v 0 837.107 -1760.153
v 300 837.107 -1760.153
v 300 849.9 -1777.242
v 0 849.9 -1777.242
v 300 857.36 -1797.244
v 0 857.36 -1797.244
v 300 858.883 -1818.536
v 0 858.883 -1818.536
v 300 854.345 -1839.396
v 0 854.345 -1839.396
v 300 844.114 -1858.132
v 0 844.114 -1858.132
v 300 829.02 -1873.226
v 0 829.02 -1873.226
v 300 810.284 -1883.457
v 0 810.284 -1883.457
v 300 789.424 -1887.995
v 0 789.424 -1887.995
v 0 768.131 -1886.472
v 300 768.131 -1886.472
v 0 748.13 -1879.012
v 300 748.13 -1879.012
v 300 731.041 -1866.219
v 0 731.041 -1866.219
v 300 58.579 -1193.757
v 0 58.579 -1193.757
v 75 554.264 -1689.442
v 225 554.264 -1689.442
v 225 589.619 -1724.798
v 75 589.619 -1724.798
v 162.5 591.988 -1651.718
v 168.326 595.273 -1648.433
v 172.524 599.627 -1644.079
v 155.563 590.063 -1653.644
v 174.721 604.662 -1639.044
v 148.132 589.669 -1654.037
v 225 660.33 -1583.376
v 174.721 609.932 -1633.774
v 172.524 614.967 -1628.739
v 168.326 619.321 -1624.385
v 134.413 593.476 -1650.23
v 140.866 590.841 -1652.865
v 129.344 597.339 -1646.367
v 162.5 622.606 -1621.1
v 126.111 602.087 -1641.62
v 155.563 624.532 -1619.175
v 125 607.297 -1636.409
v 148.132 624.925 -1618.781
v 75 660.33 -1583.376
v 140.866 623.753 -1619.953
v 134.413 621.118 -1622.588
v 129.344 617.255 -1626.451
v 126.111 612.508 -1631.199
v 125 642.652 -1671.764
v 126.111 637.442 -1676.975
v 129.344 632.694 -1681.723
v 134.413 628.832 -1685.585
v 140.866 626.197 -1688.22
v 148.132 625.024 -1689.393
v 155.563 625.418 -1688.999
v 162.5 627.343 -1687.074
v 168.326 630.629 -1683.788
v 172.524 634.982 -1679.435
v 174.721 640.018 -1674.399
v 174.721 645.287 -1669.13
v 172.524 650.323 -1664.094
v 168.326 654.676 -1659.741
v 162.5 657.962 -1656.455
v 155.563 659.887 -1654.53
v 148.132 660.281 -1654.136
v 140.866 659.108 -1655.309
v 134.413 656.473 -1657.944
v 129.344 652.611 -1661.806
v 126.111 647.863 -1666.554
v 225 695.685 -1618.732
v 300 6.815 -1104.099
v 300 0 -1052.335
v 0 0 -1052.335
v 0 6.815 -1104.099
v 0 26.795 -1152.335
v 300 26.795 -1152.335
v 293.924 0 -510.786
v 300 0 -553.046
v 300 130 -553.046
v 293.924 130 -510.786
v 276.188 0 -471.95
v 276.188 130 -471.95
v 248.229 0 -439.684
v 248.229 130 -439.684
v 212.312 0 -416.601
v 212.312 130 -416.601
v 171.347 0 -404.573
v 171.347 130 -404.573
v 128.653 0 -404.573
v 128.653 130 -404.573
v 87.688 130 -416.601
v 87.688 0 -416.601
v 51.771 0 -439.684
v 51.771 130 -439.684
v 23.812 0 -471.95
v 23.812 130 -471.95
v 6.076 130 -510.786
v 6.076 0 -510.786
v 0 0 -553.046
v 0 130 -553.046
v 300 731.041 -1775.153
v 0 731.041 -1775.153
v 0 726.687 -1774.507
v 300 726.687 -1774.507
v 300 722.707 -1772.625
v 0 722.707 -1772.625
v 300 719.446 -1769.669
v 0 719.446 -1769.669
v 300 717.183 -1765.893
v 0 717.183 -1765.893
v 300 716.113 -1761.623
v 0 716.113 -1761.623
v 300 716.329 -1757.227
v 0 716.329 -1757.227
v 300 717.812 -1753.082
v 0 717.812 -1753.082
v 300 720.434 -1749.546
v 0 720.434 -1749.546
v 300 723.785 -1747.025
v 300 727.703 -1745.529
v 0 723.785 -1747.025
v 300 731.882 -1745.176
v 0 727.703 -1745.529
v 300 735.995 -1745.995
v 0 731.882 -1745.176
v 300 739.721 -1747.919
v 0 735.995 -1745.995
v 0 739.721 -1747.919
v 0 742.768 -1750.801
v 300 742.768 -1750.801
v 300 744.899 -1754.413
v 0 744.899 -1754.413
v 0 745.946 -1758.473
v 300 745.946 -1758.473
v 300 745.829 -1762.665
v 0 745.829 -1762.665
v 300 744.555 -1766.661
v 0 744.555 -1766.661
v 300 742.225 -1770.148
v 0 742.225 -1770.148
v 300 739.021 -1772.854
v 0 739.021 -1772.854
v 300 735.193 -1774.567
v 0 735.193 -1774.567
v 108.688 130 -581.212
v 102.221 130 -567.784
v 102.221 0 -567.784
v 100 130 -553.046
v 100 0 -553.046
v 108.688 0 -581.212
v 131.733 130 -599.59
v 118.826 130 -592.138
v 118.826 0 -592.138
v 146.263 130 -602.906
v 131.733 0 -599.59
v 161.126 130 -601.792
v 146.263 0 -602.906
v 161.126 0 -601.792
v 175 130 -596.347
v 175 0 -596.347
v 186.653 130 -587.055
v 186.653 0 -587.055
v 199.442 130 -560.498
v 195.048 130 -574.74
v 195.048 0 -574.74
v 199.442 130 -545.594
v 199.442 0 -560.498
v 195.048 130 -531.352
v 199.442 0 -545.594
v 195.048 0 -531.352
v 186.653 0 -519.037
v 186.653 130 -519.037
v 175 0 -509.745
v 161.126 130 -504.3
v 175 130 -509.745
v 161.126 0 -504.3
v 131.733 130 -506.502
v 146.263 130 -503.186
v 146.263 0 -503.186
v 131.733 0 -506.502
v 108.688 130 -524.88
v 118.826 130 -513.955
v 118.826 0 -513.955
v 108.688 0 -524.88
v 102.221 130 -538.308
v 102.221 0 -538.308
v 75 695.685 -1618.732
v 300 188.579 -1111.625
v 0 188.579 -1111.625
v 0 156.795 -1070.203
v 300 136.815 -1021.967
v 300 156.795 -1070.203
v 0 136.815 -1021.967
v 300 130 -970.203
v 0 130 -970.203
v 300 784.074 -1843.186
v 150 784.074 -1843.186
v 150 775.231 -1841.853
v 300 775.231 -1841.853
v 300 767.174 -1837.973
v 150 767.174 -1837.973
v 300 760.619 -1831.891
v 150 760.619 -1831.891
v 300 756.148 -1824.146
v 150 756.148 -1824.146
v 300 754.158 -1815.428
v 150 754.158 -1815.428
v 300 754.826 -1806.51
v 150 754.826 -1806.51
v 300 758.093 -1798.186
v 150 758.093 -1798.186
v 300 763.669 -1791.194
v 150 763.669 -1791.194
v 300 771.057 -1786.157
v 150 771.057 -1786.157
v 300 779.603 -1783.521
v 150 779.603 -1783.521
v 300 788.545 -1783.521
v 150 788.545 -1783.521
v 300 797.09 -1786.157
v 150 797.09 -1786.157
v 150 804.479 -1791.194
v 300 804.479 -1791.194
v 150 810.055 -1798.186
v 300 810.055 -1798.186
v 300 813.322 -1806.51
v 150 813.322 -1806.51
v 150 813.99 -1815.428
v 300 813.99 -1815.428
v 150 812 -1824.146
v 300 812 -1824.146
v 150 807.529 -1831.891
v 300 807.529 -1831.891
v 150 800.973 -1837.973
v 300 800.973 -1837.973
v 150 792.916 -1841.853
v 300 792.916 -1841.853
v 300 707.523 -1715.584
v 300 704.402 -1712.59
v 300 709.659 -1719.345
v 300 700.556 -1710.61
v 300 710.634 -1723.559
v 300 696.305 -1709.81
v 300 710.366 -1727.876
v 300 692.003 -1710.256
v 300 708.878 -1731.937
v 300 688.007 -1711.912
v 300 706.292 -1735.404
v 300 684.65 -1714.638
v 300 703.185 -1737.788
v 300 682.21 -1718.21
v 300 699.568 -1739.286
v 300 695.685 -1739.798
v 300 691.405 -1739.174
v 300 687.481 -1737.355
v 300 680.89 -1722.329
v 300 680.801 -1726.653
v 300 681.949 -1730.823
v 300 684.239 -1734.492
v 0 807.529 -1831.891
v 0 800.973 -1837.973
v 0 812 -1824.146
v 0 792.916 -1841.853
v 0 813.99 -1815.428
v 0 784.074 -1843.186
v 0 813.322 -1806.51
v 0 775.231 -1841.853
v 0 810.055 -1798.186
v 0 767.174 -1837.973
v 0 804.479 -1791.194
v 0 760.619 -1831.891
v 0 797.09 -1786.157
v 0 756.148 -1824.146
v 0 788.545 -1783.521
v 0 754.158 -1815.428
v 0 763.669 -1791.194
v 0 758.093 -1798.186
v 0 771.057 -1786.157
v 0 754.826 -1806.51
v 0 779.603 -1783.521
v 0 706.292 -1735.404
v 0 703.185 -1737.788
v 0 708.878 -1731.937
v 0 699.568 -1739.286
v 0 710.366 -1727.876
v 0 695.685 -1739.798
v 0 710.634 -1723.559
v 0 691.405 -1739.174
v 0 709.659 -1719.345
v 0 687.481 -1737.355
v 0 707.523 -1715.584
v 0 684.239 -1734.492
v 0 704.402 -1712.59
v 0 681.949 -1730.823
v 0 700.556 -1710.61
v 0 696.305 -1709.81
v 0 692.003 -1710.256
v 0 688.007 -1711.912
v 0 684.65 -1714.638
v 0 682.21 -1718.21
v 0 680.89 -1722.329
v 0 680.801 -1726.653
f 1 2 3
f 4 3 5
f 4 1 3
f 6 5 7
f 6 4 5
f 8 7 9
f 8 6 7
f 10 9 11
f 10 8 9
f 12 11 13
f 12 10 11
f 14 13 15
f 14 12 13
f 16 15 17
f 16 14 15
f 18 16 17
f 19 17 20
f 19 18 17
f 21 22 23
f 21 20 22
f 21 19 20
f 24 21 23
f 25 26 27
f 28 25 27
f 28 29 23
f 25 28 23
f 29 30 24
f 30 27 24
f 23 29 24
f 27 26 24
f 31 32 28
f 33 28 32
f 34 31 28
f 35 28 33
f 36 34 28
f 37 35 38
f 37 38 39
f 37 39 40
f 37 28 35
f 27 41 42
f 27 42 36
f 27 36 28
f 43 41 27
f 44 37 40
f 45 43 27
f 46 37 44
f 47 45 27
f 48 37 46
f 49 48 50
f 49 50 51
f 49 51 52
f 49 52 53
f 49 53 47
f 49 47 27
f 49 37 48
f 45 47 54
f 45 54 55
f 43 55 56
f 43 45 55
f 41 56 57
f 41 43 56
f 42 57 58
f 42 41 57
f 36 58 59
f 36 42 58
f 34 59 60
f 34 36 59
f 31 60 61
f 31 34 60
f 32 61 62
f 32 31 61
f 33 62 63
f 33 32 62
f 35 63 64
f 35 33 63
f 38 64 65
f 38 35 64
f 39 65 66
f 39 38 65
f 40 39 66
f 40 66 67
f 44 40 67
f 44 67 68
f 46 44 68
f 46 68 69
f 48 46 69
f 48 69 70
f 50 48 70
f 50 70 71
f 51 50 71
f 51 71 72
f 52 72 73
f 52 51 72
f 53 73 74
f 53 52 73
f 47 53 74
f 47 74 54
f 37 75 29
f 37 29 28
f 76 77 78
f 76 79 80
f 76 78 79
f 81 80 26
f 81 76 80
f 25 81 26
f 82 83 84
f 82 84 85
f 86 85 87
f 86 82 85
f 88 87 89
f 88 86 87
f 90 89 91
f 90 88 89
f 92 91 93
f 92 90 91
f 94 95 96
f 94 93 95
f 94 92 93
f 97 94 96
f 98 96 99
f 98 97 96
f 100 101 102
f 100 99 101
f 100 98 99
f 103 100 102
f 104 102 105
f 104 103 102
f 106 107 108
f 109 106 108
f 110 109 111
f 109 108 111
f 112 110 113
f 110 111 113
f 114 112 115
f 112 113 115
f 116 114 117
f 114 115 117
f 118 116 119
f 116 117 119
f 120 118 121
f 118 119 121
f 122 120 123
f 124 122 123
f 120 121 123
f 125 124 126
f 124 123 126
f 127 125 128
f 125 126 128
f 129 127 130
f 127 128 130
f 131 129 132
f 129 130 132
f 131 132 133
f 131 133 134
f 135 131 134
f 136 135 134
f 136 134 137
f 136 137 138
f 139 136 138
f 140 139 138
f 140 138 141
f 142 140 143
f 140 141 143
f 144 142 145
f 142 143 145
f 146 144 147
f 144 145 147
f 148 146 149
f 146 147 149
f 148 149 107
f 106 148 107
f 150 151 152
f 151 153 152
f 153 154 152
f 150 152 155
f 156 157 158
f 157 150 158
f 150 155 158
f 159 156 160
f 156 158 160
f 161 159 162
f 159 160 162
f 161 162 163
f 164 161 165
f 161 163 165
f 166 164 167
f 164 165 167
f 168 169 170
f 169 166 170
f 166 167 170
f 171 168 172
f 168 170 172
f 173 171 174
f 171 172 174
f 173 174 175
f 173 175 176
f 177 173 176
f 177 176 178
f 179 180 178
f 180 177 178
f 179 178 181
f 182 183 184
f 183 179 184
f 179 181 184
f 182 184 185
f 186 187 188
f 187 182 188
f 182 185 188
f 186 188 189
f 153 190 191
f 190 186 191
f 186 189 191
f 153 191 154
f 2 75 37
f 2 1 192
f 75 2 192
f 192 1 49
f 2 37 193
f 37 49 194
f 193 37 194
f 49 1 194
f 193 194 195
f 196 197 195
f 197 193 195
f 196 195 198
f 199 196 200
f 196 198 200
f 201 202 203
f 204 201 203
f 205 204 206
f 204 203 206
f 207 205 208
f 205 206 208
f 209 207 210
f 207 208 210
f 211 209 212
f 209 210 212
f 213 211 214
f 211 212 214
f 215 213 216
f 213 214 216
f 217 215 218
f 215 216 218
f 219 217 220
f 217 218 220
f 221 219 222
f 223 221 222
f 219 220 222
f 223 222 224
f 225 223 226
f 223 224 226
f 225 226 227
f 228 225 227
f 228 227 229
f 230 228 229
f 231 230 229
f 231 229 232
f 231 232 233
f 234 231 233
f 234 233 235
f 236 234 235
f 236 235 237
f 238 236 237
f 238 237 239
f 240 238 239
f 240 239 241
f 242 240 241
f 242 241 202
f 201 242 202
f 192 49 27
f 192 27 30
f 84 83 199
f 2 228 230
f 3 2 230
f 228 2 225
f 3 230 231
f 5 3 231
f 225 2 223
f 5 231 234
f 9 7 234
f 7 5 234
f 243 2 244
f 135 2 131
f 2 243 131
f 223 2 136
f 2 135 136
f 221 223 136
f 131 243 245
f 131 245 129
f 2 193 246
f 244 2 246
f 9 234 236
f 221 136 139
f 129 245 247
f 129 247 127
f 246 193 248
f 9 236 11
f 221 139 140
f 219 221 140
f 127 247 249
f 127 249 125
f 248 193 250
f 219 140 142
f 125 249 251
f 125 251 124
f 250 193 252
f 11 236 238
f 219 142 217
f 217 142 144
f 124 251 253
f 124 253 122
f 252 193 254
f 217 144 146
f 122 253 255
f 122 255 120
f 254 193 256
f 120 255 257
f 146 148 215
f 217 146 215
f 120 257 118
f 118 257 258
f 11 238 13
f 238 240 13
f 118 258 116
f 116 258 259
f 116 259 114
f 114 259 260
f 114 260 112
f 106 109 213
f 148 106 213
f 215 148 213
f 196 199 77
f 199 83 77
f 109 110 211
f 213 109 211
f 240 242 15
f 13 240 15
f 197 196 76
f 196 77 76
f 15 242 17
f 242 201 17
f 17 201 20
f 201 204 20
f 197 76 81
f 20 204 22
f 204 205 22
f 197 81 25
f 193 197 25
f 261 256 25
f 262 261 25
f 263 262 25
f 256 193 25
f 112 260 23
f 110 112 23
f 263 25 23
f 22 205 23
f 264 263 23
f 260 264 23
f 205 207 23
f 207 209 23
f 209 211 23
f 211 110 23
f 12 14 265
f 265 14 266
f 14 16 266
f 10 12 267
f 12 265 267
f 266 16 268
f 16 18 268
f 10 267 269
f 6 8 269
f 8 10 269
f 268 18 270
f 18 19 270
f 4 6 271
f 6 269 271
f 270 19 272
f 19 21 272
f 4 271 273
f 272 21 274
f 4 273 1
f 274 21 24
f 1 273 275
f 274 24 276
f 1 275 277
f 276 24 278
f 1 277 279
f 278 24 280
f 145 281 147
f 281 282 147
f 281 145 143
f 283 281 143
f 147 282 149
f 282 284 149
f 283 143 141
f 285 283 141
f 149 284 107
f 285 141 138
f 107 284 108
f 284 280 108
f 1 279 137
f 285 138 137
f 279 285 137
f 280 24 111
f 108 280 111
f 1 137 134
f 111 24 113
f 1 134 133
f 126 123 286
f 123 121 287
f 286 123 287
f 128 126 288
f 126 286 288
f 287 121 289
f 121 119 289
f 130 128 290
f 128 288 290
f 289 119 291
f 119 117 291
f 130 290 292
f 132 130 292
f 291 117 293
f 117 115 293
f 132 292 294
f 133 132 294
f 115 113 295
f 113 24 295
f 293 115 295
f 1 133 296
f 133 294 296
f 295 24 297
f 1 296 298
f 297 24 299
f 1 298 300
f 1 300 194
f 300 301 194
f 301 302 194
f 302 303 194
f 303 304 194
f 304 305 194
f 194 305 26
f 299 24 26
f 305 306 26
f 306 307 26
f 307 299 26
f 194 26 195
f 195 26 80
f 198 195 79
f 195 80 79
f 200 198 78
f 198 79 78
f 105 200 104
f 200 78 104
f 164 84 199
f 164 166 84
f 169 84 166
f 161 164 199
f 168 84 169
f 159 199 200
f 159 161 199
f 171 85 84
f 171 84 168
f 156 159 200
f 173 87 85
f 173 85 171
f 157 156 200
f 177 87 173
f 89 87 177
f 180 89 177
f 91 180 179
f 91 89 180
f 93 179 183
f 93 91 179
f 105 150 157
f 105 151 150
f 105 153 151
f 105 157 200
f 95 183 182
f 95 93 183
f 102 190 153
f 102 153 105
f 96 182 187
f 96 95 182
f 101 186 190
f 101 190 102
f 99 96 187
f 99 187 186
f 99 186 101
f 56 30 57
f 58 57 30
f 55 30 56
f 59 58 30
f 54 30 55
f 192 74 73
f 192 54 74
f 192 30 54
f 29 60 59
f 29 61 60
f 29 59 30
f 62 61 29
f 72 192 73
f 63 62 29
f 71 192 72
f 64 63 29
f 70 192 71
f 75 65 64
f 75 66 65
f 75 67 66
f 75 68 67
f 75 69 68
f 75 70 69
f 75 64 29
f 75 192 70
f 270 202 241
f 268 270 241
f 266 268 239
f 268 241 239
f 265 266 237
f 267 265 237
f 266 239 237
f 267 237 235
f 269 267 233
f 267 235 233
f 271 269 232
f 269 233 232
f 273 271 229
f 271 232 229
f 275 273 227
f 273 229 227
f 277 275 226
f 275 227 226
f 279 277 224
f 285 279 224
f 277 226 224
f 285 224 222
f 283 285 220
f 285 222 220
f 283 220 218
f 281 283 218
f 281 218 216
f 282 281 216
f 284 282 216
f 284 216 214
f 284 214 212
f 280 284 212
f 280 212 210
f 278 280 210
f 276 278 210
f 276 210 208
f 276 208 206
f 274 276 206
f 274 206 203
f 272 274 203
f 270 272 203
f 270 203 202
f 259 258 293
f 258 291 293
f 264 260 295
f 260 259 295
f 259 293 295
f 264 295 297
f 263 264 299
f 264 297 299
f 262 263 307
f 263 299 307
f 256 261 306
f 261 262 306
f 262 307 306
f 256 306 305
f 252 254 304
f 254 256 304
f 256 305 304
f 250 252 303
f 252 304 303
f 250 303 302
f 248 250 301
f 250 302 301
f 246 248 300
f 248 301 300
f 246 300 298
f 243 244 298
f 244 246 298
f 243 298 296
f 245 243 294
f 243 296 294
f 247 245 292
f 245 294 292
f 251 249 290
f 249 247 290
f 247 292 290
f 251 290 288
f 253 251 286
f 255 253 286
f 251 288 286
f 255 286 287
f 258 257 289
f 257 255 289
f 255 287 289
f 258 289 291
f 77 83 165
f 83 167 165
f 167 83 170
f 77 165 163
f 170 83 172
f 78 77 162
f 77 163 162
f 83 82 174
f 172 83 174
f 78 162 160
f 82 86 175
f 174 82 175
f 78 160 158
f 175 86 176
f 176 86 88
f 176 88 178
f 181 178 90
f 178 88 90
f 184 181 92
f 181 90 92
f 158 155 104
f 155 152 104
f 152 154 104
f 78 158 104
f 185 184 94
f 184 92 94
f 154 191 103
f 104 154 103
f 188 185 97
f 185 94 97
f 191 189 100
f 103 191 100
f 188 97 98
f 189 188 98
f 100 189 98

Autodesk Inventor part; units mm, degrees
ref_plane "YZ Plane" through (0, 0, 0) normal (1, 0, 0) x (0, 1, 0)
ref_plane "XZ Plane" through (0, 0, 0) normal (0, 1, 0) x (-1, 0, 0)
ref_plane "XY Plane" through (0, 0, 0) normal (0, 0, 1) x (1, 0, 0)
sketch "草圖1" plane through (0, 0, 0) normal (0, 1, 0) x (-1, 0, 0)
  line L0 (0, 150) -> (-300, 150)
  line L1 (-300, 0) -> (-300, 150)
  arc A0 (-300, 0) -> (0, 0) centre (-150, 0) ccw
  line L2 (0, 150) -> (0, 0)
  line L3 (0, 271.7864) -> (0, 150)
  line L4 (-300, 271.7864) -> (0, 271.7864)
  line L5 (-300, 150) -> (-300, 271.7864)
  circle A1 centre (-150, 0) radius 50
  line L6 (-30.3819, -276.523) -> (-200, -276.523)
  line L7 (0, -703.0461) -> (-300, -703.0461)
  line L8 (-300, -553.0461) -> (-300, -703.0461)
  arc A2 (0, -553.0461) -> (-300, -553.0461) centre (-150, -553.0461) ccw
  line L9 (0, -703.0461) -> (0, -553.0461)
  circle A3 centre (-150, -553.0461) radius 50
extrude "擠出1" add sketch "草圖1" along normal blind 130 contours L7 L8 A2 L9
ref_plane "工作平面1" through (150, 0, -553.0461) normal (1, 0, 0) x (0, 0, -1)
sketch "草圖2" plane through (150, 0, -553.0461) normal (1, 0, 0) x (0, 0, -1)
  line L0 (-150, 0) -> (-150, 130) projected
  line L1 (-150, 130) -> (-50, 130) projected
  line L2 (-50, 130) -> (-50, 0) projected
  line L3 (-50, 0) -> (-150, 0) projected
  line L4 (150, 130) -> (150, 0) projected
  line L5 (150, 0) -> (50, 0) projected
  line L6 (50, 0) -> (50, 130) projected
  line L7 (50, 130) -> (150, 130) projected
  line L8 (150, 0) -> (150, 130) projected
  line L9 (150, 130) -> (500, 130)
  line L10 (500, 130) -> (500, 0)
  line L11 (500, 0) -> (150, 0)
  line L12 (150, 0) -> (150, 130)
  line L13 (150, 130) -> (0, 130) projected
  line L14 (500, 130) -> (606.066, 23.934)
  line L15 (606.066, 23.934) -> (1313.1728, 731.0408)
  line L16 (1313.1728, 731.0408) -> (1207.1068, 837.1068)
  line L17 (1207.1068, 837.1068) -> (500, 130)
  line L18 (606.066, 23.934) -> (582.132, 0)
  line L19 (500, 0) -> (582.132, 0)
  circle A0 centre (1260.1398, 784.0738) radius 75
  circle A1 centre (1207.1068, 731.0408) radius 15
  line L20 (1260.1398, 784.0738) -> (1207.1068, 731.0408)
  circle A2 centre (1260.1398, 784.0738) radius 30
  circle A3 centre (1171.7514, 695.6854) radius 15
  line L21 (1207.1068, 731.0408) -> (1171.7514, 695.6854)
  point P0 (-553.0461, 0)
  point P1 (1313.1728, 731.0408)
  dimension "d2" = 500
  dimension "d3" = 1000
  dimension "d4" = 150
  dimension "d5" = 45
  dimension "d6" = 30
  dimension "d7" = 60
  dimension "d8" = 30
  dimension "d9" = 50
extrude "擠出2" add sketch "草圖2" along normal mid plane 300 contours L9 L10 L11 L4 | L14 L18 L19 L10 | L17 A0 A1 L15 L14 | A0 L16 A2 | L16 A2 L20 A1 A0 | A0 A1 L20 A2 L16
sketch "草圖3" plane through (0, 130, -1053.0461) normal (0, 0.7071, 0.7071) x (1, 0, 0)
  line L0 (0, -183.8478) -> (0, 0) projected
  line L1 (0, 0) -> (0, 1000) projected
  line L2 (0, 1000) -> (300, 1000) projected
  line L3 (300, 1000) -> (300, 0) projected
  line L4 (0, 0) -> (300, 0) projected
  line L5 (300, -183.8478) -> (0, -183.8478) projected
  line L6 (300, 0) -> (300, -183.8478) projected
  line L7 (75, 800) -> (225, 800)
  line L8 (225, 800) -> (225, 750)
  line L9 (225, 750) -> (75, 750)
  line L10 (75, 750) -> (75, 800)
  point P0 (0, -836.5399)
  point P1 (150, 800)
  point P2 (150, 1000)
  dimension "d12" = 200
  dimension "d13" = 50
  dimension "d14" = 150
extrude "擠出3" cut sketch "草圖3" against normal blind 300 contours L7 L8 L9 L10
fillet "圓角1" radius 200 2 edges at (150, 130, -1053.0461) (150, 0, -1135.1781)
sketch "草圖4" plane through (225, 660.3301, -1583.3761) normal (0, 0.7071, -0.7071) x (-1, 0, 0)
  line L0 (225, -150) -> (150, -150) projected
  line L1 (150, -150) -> (0, -150) projected
  line L2 (0, -150) -> (-75, -150) projected
  line L3 (-75, -150) -> (-75, 0) projected
  line L4 (-75, 0) -> (0, 0) projected
  line L5 (0, 0) -> (0, -150) projected
  line L6 (225, 0) -> (225, -150) projected
  line L7 (150, 0) -> (225, 0) projected
  line L8 (0, 0) -> (150, 0) projected
  line L9 (150, -150) -> (150, 0) projected
  circle A0 centre (75, -75) radius 25
  point P0 (225, 652.6921)
  point P1 (75, 0)
  point P2 (0, -75)
  dimension "d18" = 50
extrude "擠出4" add sketch "草圖4" along normal up to next contours A0
equation "\"d8\" = d6"
properties part number "主吊臂"
